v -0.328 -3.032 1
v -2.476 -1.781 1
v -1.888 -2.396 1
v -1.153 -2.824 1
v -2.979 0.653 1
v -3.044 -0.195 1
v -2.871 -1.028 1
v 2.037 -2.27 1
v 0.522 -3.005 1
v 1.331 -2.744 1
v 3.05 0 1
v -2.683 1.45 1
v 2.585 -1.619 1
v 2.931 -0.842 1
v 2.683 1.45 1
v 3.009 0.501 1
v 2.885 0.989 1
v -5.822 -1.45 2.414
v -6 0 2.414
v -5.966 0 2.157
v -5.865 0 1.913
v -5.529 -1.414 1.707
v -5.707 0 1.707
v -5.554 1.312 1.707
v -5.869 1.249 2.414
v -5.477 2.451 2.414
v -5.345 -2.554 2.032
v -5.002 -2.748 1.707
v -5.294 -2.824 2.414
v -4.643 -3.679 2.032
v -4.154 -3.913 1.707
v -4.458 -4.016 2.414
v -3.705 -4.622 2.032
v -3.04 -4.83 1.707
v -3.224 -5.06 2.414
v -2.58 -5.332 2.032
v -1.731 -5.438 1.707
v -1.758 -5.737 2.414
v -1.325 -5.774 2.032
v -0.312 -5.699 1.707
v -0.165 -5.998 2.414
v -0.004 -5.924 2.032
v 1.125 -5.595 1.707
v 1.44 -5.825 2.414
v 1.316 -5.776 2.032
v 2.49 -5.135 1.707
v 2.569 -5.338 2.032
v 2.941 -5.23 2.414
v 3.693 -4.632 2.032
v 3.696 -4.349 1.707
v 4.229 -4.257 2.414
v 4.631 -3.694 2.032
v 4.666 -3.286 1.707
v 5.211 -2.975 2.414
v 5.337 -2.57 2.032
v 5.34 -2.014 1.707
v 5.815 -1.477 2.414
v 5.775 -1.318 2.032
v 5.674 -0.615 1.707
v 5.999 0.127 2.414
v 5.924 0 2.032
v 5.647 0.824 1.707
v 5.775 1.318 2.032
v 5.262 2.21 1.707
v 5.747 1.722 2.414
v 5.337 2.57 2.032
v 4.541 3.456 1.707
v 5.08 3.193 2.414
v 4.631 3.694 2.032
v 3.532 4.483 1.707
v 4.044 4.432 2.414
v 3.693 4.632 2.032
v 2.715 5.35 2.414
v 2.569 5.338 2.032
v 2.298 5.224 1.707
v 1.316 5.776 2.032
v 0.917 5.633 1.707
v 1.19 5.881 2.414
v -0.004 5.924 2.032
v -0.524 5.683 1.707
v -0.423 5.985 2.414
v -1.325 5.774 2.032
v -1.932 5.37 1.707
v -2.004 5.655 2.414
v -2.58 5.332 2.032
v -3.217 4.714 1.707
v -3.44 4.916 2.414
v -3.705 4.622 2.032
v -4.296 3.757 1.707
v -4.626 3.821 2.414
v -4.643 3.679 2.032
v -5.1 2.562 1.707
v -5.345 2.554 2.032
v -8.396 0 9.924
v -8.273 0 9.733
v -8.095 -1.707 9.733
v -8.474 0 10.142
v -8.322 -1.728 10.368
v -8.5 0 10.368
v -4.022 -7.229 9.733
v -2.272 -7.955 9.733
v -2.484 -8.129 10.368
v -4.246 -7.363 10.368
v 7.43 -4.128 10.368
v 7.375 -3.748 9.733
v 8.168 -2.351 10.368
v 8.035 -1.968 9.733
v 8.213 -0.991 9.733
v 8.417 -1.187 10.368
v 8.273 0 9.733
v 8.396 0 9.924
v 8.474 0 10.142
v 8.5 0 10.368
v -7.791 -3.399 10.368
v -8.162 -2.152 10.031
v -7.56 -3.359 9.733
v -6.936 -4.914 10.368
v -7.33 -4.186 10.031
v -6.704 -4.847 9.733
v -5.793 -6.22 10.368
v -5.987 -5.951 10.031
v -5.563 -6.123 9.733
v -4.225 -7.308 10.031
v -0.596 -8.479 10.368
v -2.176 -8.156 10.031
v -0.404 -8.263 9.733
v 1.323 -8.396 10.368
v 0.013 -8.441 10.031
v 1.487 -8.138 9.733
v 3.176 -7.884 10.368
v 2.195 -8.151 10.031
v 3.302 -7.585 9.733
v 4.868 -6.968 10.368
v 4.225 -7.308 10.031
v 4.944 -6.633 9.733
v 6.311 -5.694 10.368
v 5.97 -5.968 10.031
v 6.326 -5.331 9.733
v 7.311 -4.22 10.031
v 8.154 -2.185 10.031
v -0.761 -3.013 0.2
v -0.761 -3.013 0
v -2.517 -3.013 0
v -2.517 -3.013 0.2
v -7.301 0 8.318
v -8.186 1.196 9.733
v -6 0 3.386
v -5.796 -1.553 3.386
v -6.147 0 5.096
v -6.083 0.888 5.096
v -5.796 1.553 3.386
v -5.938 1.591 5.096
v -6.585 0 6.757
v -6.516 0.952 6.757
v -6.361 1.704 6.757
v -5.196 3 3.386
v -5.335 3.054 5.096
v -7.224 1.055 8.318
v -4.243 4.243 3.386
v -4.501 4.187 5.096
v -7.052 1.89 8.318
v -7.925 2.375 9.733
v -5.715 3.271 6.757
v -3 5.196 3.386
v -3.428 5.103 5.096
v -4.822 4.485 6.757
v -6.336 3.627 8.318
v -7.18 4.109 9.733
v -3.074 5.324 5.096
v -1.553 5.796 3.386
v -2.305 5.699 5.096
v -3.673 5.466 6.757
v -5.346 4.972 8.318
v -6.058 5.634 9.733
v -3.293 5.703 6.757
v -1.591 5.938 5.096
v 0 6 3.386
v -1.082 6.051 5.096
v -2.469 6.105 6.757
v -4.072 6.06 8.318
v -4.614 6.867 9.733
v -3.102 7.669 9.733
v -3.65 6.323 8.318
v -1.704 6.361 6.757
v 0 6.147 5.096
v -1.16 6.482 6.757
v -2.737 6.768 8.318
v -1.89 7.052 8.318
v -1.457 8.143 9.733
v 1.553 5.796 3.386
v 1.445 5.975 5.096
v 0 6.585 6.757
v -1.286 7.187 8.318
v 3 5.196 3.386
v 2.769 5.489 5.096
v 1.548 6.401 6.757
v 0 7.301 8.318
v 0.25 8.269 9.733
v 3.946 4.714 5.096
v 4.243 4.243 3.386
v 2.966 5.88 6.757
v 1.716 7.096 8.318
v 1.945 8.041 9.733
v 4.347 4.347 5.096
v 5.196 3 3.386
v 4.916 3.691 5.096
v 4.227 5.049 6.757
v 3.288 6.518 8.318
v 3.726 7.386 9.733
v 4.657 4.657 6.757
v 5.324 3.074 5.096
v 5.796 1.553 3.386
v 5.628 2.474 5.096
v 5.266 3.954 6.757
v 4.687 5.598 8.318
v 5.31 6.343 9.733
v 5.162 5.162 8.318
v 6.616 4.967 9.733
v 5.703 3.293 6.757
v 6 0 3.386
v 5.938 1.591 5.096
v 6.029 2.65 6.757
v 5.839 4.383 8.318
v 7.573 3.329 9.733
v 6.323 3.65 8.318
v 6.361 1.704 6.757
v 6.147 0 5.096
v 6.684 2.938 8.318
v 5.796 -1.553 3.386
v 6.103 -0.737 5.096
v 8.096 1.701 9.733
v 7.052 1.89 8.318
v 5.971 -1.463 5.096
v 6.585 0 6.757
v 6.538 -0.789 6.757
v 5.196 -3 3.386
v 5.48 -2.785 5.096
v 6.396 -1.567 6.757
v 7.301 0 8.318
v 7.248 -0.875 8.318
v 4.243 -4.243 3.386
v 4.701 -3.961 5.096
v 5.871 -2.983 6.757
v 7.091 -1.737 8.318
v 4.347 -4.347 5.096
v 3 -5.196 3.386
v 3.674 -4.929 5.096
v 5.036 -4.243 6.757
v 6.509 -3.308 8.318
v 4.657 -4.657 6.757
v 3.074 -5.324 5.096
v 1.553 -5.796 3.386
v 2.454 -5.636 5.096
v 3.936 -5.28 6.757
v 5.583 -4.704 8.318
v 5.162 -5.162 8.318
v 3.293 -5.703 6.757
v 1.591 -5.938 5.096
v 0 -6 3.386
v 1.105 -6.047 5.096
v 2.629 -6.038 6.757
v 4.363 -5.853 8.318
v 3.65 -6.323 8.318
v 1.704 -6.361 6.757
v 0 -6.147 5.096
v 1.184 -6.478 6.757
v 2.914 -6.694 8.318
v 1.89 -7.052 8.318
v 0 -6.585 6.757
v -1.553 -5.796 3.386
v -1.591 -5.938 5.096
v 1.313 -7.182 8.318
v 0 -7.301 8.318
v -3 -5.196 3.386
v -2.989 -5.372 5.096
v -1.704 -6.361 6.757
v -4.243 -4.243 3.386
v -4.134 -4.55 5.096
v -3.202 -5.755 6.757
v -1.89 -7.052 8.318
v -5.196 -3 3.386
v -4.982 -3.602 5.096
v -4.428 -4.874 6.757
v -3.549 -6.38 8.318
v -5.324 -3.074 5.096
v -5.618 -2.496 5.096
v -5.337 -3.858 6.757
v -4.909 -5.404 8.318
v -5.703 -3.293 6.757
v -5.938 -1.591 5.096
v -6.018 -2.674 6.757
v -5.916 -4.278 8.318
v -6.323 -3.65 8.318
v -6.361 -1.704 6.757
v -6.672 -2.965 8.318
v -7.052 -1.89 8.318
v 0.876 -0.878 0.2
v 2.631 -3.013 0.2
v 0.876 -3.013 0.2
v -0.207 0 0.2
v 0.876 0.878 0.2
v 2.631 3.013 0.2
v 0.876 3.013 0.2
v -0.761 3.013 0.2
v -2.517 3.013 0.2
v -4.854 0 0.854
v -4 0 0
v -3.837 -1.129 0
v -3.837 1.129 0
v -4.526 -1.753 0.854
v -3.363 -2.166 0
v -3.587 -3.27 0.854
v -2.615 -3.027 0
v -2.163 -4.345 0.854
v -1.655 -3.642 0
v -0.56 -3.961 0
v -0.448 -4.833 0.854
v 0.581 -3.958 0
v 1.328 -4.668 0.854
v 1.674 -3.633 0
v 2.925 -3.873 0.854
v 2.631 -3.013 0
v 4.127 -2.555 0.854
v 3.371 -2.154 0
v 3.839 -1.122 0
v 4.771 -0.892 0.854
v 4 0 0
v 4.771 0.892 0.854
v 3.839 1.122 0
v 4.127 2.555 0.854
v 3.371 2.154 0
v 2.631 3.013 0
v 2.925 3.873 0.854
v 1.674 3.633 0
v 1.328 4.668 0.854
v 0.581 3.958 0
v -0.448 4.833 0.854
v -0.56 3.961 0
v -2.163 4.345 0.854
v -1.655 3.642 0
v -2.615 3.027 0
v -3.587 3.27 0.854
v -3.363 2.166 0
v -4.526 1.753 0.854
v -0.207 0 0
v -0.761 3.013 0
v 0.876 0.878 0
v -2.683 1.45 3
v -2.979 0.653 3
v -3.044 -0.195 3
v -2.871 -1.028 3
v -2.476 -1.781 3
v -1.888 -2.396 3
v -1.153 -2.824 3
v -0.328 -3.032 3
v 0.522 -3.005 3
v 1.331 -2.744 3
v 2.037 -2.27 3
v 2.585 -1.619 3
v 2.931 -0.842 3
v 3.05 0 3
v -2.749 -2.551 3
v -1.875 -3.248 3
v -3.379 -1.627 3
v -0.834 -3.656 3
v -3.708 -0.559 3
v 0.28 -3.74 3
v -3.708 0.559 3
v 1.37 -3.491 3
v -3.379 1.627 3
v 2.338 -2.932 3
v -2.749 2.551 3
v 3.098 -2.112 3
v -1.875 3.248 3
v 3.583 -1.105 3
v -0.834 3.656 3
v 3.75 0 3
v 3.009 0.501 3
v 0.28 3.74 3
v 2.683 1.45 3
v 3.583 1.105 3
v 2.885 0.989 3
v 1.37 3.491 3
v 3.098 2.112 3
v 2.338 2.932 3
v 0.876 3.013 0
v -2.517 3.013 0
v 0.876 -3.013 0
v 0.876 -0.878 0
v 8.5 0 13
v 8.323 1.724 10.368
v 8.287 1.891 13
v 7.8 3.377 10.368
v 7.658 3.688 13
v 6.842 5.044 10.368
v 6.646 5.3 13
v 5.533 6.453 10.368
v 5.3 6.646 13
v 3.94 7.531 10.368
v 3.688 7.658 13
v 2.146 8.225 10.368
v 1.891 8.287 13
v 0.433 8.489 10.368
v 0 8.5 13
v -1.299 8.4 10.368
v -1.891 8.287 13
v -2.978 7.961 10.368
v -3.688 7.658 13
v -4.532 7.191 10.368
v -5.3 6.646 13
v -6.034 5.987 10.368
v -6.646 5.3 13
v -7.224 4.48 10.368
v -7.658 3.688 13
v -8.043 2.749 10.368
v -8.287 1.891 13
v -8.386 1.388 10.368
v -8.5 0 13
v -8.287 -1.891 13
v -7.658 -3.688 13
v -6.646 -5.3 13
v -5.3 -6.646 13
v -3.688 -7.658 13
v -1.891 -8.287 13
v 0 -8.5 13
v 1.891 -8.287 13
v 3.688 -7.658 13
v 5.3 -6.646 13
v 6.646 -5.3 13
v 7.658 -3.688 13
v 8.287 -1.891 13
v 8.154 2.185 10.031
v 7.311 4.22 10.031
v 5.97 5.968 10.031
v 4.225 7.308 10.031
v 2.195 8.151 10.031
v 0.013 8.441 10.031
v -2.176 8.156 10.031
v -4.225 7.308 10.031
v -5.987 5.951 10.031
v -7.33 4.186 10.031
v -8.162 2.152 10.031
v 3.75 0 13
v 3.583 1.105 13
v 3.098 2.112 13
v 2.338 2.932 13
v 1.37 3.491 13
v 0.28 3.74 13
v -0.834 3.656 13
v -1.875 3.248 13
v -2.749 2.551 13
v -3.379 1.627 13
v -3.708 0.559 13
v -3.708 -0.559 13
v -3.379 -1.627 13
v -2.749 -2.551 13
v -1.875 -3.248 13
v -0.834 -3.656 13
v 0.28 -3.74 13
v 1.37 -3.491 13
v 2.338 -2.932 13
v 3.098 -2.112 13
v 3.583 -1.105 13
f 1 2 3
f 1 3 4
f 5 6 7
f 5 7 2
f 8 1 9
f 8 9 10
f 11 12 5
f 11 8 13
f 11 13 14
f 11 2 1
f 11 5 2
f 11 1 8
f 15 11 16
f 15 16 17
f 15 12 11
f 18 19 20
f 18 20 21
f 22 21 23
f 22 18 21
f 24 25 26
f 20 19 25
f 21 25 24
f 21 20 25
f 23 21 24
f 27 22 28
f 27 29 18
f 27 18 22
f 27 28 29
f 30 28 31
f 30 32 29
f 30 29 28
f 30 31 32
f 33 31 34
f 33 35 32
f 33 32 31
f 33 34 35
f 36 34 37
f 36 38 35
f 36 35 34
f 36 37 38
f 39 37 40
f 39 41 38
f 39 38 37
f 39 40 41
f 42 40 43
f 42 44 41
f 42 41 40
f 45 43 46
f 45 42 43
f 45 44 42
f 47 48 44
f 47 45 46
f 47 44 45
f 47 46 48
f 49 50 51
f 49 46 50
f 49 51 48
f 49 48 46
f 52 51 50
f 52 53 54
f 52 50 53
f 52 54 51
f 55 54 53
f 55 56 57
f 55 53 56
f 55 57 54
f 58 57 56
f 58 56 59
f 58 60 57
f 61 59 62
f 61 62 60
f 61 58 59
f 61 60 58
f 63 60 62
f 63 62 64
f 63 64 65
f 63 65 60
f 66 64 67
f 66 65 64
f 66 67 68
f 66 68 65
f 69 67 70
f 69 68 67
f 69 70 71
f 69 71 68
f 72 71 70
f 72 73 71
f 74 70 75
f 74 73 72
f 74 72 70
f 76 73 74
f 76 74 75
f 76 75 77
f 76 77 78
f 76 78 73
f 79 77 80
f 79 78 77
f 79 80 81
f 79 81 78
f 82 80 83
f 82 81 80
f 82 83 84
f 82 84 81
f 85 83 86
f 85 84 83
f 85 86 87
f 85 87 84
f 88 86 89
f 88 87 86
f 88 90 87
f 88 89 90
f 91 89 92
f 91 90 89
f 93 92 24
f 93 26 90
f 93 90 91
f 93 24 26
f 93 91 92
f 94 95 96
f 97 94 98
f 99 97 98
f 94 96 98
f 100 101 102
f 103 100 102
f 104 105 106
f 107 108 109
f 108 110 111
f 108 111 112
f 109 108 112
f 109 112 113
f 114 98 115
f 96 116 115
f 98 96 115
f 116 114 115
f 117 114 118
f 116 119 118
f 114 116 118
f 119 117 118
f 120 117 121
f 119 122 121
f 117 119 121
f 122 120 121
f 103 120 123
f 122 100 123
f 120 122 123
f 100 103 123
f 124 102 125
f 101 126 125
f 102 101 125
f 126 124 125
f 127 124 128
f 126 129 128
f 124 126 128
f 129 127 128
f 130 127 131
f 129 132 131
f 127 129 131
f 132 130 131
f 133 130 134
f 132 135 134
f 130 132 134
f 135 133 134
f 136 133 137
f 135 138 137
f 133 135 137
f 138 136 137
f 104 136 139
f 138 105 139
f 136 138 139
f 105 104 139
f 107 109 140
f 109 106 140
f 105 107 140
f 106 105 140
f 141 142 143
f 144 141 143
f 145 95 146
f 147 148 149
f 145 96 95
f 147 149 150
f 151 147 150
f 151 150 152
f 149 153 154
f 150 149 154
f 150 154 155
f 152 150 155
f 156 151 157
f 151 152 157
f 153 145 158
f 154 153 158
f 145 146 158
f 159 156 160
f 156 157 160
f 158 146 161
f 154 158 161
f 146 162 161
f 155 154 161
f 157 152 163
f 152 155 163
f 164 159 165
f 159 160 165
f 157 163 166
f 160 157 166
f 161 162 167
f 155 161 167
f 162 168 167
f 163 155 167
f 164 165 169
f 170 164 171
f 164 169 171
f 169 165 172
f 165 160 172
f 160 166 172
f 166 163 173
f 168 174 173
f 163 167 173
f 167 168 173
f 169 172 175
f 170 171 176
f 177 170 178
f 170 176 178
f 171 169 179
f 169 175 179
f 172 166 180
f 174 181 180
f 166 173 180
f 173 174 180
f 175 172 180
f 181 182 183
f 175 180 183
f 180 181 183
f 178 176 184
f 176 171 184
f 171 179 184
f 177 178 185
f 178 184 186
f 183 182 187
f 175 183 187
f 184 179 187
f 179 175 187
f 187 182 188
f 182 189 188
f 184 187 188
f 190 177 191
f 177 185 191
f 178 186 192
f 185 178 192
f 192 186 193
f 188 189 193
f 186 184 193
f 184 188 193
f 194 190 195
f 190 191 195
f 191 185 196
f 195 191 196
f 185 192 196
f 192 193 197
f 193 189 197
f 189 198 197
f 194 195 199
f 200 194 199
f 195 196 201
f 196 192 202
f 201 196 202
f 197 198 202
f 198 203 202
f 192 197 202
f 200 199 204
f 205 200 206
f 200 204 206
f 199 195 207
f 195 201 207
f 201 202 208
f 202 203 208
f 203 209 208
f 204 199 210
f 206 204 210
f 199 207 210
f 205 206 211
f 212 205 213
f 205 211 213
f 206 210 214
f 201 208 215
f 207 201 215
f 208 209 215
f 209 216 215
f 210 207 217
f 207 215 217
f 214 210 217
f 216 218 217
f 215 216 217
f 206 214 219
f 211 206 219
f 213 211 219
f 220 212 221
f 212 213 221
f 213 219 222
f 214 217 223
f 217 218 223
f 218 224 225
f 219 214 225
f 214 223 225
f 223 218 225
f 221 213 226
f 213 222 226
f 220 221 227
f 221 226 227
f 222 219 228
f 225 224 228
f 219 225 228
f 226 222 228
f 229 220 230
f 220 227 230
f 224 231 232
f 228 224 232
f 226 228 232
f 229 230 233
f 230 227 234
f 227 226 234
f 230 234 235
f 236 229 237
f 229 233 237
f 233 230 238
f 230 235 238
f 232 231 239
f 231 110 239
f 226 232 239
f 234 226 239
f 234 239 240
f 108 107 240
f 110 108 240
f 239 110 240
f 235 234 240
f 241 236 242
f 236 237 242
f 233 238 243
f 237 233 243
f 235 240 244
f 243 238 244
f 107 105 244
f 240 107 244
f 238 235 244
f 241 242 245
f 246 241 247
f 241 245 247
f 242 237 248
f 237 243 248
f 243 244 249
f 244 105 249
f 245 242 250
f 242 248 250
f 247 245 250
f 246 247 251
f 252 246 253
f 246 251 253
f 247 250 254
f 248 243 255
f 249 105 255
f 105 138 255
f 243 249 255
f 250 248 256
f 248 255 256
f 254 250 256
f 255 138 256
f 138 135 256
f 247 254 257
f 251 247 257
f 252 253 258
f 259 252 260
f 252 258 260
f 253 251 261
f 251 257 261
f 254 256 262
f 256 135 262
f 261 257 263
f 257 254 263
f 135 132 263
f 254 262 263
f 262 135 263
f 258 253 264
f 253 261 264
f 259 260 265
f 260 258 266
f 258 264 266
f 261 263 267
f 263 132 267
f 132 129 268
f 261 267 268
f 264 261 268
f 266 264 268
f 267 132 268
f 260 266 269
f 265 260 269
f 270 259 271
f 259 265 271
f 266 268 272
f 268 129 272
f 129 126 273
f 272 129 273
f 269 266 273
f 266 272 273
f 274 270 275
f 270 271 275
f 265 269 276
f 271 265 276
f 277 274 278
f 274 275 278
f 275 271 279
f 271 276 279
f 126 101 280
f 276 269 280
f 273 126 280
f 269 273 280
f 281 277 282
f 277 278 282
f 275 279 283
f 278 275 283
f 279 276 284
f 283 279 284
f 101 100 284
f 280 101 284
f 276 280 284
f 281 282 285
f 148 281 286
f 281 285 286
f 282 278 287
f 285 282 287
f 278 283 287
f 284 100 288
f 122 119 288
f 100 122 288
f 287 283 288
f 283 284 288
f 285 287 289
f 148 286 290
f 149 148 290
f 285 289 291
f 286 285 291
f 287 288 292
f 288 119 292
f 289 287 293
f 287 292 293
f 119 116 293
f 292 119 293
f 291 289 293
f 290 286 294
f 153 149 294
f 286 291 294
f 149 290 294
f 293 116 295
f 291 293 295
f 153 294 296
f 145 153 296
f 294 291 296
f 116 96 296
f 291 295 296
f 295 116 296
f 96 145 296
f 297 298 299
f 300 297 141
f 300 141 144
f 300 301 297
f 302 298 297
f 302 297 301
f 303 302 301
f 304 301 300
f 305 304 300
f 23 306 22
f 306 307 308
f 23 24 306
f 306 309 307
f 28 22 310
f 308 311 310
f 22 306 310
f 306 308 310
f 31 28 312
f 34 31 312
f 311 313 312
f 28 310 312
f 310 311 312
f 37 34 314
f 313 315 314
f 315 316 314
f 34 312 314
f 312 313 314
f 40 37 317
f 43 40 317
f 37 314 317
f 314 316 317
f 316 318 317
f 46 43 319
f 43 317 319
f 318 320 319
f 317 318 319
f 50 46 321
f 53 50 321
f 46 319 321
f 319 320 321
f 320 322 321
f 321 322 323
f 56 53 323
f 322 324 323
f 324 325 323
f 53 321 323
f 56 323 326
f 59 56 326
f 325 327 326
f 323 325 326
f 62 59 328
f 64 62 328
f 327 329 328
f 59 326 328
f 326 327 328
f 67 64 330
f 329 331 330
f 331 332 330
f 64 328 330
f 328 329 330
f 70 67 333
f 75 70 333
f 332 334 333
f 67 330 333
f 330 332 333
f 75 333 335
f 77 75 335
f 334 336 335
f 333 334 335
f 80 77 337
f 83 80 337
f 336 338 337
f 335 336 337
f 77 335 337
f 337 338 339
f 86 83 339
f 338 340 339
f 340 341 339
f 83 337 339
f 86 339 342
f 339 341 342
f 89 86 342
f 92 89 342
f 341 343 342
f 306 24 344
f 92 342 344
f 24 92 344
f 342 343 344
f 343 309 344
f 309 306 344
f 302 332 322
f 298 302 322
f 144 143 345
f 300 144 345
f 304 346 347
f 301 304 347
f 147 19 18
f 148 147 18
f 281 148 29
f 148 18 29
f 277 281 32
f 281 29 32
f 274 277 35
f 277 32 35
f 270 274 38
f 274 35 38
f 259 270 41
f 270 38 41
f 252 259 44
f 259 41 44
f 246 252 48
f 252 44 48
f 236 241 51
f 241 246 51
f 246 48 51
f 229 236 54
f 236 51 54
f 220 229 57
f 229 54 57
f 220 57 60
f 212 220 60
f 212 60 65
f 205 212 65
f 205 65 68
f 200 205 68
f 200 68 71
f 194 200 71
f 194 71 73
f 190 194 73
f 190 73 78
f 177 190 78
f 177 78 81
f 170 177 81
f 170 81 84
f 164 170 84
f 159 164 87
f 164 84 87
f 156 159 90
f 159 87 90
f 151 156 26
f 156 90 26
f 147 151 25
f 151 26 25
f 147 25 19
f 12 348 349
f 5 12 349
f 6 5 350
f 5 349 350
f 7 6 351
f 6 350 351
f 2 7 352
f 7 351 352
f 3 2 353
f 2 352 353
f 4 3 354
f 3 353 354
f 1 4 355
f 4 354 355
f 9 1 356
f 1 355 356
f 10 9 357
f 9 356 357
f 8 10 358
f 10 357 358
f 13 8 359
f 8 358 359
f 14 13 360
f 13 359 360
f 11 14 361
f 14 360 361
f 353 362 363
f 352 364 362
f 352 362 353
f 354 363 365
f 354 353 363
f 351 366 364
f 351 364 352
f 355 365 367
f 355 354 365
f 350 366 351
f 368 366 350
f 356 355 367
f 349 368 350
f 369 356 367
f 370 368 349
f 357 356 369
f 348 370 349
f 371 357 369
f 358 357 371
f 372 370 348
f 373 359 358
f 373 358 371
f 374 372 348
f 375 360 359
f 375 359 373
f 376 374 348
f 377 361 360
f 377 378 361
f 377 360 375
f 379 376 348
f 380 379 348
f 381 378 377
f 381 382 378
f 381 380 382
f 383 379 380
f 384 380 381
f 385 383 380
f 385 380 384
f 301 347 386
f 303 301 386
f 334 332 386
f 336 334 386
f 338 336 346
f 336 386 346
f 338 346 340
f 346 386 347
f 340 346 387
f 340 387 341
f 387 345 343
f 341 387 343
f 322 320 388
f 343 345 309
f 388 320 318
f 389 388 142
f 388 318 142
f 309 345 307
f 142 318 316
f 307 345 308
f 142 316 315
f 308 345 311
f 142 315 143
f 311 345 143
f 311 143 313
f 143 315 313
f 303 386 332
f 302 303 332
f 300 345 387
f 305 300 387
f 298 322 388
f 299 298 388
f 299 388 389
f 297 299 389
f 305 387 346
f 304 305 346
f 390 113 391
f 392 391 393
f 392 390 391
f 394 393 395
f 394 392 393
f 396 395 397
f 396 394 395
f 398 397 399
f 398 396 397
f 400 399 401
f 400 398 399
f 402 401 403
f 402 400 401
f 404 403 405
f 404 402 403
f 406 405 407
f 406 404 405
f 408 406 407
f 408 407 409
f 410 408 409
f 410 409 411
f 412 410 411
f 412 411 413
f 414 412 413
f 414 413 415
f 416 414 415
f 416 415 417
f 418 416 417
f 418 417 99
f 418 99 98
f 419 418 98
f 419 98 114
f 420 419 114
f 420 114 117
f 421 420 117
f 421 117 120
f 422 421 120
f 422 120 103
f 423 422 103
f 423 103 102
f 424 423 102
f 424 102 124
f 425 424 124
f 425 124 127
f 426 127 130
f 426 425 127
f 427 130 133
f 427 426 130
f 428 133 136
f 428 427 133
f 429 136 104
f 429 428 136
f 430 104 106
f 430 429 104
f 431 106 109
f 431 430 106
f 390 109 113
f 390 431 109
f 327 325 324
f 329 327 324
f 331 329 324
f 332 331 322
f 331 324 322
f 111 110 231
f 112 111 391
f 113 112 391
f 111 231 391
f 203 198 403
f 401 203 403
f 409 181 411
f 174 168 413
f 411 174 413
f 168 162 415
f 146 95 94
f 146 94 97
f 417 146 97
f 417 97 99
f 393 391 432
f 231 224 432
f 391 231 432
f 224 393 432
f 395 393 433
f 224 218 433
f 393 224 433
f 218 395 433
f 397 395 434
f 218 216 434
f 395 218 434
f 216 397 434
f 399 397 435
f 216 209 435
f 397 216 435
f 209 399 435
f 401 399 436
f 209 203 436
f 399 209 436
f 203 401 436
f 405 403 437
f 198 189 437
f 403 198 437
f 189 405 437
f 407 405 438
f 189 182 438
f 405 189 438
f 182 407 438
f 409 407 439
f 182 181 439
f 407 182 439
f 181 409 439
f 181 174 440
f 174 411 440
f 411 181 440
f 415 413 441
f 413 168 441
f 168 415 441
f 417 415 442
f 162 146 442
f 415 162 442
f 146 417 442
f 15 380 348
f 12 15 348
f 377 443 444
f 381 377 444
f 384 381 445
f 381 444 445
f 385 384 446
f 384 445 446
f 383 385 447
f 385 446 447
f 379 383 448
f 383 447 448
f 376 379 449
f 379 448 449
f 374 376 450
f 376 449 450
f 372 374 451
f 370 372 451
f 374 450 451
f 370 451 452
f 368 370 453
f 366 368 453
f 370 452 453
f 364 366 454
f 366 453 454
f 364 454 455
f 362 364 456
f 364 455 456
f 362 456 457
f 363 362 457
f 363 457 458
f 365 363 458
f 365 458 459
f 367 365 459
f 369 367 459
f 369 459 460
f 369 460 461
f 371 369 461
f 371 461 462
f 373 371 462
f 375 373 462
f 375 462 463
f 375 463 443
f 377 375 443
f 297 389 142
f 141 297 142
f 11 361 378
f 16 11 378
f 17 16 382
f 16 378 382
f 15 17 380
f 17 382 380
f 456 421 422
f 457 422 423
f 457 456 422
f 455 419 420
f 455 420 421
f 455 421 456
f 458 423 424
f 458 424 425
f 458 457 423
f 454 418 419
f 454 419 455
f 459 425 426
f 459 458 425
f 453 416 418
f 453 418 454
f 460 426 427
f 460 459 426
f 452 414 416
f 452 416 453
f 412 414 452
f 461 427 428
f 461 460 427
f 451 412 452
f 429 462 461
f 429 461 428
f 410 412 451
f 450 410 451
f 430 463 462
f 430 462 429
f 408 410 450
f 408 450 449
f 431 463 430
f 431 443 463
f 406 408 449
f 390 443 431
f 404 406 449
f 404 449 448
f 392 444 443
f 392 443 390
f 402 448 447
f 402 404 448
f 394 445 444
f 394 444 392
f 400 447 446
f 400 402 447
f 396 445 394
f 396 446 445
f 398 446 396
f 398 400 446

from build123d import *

# Parameters (mm, degrees)
ESBO_O1_R                = 6
RESSALTO_EXTRUS_O1_DEPTH = 13
CORTE_EXTRUS_O1_DEPTH    = 12
ESBO_O3_R                = 3.75
CORTE_EXTRUS_O2_DEPTH    = 10
CHANFRO1_SIZE            = 2
ESBO_O4_R                = 8.5
ESBO_O4_R_2              = 3.75
RESSALTO_EXTRUS_O2_DEPTH = 3
FILETE1_R                = 10
FILETE3_R                = 1
CORTE_EXTRUS_O3_DEPTH    = 0.2


with BuildPart() as part:
    # Esboço1 → Ressalto-extrusão1 (new body)
    with BuildSketch(Plane.XY):
        with Locations(Location((0, 0, 0), (0, 0, 180))):
            Circle(ESBO_O1_R)
    extrude(amount=RESSALTO_EXTRUS_O1_DEPTH)

    # Esboço2 → Corte-extrusão1 (cut)
    with BuildSketch(Plane.XY.offset(13)):
        with BuildLine():
            Line((2.683281573, 1.45), (-2.683281573, 1.45))
            ThreePointArc((-2.683281573, 1.45), (-0.747827254, -2.956899457), (3.05, 0))
            ThreePointArc((3.05, 0), (2.956899457, 0.747827254), (2.683281573, 1.45))
        make_face()
    extrude(amount=-CORTE_EXTRUS_O1_DEPTH, mode=Mode.SUBTRACT)

    # Esboço3 → Corte-extrusão2 (cut)
    with BuildSketch(Plane.XY.offset(13)):
        Circle(ESBO_O3_R)
    extrude(amount=-CORTE_EXTRUS_O2_DEPTH, mode=Mode.SUBTRACT)

    # Chanfro1
    chanfro1_edges = [part.edges().sort_by_distance(p)[0] for p in [
        (6, 0, 0),
    ]]
    chamfer(chanfro1_edges, length=CHANFRO1_SIZE)

    # Esboço4 → Ressalto-extrusão2 (add)
    with BuildSketch(Plane.XY.offset(13)):
        Circle(ESBO_O4_R)
        Circle(ESBO_O4_R_2, mode=Mode.SUBTRACT)
    extrude(amount=-RESSALTO_EXTRUS_O2_DEPTH)

    # Filete1
    # the kernel refuses this fillet: 10 mm, written as the material it adds along each edge
    with BuildSketch(Plane(origin=(0, 0, 10), x_dir=(-1, 0, 0), z_dir=(0, -1, 0))) as filete1_piece_1:
        with BuildLine():
            CenterArc((16, 6.614378278), FILETE1_R, 180, 41.409622109)
            Line((8.5, 0), (6, 0))
            Line((6, 0), (6, 6.614378278))
        make_face()
    revolve(axis=Axis((0, 0, 10), (0, 0, -1)))

    # Filete3
    filete3_edges = [part.edges().sort_by_distance(p)[0] for p in [
        (6, 0, 2),
        (0, 8.5, 10),
    ]]
    fillet(filete3_edges, radius=FILETE3_R)

    # Esboço5 → Corte-extrusão3 (cut)
    with BuildSketch(Plane(origin=(0, 0, 0), x_dir=(-1, 0, 0), z_dir=(0, 0, -1))):
        Polygon((-2.631008166, 3.012938106), (-2.631008166, -3.012938106), (-0.875588874, -3.012938106), (-0.875588874, -0.877709646), (0.761455767, -3.012938106), (2.51687506, -3.012938106), (0.206904827, 0), (2.51687506, 3.012938106), (0.761455767, 3.012938106), (-0.875588874, 0.877709646), (-0.875588874, 3.012938106), align=None)
    extrude(amount=-CORTE_EXTRUS_O3_DEPTH, mode=Mode.SUBTRACT)


solid = part.part
